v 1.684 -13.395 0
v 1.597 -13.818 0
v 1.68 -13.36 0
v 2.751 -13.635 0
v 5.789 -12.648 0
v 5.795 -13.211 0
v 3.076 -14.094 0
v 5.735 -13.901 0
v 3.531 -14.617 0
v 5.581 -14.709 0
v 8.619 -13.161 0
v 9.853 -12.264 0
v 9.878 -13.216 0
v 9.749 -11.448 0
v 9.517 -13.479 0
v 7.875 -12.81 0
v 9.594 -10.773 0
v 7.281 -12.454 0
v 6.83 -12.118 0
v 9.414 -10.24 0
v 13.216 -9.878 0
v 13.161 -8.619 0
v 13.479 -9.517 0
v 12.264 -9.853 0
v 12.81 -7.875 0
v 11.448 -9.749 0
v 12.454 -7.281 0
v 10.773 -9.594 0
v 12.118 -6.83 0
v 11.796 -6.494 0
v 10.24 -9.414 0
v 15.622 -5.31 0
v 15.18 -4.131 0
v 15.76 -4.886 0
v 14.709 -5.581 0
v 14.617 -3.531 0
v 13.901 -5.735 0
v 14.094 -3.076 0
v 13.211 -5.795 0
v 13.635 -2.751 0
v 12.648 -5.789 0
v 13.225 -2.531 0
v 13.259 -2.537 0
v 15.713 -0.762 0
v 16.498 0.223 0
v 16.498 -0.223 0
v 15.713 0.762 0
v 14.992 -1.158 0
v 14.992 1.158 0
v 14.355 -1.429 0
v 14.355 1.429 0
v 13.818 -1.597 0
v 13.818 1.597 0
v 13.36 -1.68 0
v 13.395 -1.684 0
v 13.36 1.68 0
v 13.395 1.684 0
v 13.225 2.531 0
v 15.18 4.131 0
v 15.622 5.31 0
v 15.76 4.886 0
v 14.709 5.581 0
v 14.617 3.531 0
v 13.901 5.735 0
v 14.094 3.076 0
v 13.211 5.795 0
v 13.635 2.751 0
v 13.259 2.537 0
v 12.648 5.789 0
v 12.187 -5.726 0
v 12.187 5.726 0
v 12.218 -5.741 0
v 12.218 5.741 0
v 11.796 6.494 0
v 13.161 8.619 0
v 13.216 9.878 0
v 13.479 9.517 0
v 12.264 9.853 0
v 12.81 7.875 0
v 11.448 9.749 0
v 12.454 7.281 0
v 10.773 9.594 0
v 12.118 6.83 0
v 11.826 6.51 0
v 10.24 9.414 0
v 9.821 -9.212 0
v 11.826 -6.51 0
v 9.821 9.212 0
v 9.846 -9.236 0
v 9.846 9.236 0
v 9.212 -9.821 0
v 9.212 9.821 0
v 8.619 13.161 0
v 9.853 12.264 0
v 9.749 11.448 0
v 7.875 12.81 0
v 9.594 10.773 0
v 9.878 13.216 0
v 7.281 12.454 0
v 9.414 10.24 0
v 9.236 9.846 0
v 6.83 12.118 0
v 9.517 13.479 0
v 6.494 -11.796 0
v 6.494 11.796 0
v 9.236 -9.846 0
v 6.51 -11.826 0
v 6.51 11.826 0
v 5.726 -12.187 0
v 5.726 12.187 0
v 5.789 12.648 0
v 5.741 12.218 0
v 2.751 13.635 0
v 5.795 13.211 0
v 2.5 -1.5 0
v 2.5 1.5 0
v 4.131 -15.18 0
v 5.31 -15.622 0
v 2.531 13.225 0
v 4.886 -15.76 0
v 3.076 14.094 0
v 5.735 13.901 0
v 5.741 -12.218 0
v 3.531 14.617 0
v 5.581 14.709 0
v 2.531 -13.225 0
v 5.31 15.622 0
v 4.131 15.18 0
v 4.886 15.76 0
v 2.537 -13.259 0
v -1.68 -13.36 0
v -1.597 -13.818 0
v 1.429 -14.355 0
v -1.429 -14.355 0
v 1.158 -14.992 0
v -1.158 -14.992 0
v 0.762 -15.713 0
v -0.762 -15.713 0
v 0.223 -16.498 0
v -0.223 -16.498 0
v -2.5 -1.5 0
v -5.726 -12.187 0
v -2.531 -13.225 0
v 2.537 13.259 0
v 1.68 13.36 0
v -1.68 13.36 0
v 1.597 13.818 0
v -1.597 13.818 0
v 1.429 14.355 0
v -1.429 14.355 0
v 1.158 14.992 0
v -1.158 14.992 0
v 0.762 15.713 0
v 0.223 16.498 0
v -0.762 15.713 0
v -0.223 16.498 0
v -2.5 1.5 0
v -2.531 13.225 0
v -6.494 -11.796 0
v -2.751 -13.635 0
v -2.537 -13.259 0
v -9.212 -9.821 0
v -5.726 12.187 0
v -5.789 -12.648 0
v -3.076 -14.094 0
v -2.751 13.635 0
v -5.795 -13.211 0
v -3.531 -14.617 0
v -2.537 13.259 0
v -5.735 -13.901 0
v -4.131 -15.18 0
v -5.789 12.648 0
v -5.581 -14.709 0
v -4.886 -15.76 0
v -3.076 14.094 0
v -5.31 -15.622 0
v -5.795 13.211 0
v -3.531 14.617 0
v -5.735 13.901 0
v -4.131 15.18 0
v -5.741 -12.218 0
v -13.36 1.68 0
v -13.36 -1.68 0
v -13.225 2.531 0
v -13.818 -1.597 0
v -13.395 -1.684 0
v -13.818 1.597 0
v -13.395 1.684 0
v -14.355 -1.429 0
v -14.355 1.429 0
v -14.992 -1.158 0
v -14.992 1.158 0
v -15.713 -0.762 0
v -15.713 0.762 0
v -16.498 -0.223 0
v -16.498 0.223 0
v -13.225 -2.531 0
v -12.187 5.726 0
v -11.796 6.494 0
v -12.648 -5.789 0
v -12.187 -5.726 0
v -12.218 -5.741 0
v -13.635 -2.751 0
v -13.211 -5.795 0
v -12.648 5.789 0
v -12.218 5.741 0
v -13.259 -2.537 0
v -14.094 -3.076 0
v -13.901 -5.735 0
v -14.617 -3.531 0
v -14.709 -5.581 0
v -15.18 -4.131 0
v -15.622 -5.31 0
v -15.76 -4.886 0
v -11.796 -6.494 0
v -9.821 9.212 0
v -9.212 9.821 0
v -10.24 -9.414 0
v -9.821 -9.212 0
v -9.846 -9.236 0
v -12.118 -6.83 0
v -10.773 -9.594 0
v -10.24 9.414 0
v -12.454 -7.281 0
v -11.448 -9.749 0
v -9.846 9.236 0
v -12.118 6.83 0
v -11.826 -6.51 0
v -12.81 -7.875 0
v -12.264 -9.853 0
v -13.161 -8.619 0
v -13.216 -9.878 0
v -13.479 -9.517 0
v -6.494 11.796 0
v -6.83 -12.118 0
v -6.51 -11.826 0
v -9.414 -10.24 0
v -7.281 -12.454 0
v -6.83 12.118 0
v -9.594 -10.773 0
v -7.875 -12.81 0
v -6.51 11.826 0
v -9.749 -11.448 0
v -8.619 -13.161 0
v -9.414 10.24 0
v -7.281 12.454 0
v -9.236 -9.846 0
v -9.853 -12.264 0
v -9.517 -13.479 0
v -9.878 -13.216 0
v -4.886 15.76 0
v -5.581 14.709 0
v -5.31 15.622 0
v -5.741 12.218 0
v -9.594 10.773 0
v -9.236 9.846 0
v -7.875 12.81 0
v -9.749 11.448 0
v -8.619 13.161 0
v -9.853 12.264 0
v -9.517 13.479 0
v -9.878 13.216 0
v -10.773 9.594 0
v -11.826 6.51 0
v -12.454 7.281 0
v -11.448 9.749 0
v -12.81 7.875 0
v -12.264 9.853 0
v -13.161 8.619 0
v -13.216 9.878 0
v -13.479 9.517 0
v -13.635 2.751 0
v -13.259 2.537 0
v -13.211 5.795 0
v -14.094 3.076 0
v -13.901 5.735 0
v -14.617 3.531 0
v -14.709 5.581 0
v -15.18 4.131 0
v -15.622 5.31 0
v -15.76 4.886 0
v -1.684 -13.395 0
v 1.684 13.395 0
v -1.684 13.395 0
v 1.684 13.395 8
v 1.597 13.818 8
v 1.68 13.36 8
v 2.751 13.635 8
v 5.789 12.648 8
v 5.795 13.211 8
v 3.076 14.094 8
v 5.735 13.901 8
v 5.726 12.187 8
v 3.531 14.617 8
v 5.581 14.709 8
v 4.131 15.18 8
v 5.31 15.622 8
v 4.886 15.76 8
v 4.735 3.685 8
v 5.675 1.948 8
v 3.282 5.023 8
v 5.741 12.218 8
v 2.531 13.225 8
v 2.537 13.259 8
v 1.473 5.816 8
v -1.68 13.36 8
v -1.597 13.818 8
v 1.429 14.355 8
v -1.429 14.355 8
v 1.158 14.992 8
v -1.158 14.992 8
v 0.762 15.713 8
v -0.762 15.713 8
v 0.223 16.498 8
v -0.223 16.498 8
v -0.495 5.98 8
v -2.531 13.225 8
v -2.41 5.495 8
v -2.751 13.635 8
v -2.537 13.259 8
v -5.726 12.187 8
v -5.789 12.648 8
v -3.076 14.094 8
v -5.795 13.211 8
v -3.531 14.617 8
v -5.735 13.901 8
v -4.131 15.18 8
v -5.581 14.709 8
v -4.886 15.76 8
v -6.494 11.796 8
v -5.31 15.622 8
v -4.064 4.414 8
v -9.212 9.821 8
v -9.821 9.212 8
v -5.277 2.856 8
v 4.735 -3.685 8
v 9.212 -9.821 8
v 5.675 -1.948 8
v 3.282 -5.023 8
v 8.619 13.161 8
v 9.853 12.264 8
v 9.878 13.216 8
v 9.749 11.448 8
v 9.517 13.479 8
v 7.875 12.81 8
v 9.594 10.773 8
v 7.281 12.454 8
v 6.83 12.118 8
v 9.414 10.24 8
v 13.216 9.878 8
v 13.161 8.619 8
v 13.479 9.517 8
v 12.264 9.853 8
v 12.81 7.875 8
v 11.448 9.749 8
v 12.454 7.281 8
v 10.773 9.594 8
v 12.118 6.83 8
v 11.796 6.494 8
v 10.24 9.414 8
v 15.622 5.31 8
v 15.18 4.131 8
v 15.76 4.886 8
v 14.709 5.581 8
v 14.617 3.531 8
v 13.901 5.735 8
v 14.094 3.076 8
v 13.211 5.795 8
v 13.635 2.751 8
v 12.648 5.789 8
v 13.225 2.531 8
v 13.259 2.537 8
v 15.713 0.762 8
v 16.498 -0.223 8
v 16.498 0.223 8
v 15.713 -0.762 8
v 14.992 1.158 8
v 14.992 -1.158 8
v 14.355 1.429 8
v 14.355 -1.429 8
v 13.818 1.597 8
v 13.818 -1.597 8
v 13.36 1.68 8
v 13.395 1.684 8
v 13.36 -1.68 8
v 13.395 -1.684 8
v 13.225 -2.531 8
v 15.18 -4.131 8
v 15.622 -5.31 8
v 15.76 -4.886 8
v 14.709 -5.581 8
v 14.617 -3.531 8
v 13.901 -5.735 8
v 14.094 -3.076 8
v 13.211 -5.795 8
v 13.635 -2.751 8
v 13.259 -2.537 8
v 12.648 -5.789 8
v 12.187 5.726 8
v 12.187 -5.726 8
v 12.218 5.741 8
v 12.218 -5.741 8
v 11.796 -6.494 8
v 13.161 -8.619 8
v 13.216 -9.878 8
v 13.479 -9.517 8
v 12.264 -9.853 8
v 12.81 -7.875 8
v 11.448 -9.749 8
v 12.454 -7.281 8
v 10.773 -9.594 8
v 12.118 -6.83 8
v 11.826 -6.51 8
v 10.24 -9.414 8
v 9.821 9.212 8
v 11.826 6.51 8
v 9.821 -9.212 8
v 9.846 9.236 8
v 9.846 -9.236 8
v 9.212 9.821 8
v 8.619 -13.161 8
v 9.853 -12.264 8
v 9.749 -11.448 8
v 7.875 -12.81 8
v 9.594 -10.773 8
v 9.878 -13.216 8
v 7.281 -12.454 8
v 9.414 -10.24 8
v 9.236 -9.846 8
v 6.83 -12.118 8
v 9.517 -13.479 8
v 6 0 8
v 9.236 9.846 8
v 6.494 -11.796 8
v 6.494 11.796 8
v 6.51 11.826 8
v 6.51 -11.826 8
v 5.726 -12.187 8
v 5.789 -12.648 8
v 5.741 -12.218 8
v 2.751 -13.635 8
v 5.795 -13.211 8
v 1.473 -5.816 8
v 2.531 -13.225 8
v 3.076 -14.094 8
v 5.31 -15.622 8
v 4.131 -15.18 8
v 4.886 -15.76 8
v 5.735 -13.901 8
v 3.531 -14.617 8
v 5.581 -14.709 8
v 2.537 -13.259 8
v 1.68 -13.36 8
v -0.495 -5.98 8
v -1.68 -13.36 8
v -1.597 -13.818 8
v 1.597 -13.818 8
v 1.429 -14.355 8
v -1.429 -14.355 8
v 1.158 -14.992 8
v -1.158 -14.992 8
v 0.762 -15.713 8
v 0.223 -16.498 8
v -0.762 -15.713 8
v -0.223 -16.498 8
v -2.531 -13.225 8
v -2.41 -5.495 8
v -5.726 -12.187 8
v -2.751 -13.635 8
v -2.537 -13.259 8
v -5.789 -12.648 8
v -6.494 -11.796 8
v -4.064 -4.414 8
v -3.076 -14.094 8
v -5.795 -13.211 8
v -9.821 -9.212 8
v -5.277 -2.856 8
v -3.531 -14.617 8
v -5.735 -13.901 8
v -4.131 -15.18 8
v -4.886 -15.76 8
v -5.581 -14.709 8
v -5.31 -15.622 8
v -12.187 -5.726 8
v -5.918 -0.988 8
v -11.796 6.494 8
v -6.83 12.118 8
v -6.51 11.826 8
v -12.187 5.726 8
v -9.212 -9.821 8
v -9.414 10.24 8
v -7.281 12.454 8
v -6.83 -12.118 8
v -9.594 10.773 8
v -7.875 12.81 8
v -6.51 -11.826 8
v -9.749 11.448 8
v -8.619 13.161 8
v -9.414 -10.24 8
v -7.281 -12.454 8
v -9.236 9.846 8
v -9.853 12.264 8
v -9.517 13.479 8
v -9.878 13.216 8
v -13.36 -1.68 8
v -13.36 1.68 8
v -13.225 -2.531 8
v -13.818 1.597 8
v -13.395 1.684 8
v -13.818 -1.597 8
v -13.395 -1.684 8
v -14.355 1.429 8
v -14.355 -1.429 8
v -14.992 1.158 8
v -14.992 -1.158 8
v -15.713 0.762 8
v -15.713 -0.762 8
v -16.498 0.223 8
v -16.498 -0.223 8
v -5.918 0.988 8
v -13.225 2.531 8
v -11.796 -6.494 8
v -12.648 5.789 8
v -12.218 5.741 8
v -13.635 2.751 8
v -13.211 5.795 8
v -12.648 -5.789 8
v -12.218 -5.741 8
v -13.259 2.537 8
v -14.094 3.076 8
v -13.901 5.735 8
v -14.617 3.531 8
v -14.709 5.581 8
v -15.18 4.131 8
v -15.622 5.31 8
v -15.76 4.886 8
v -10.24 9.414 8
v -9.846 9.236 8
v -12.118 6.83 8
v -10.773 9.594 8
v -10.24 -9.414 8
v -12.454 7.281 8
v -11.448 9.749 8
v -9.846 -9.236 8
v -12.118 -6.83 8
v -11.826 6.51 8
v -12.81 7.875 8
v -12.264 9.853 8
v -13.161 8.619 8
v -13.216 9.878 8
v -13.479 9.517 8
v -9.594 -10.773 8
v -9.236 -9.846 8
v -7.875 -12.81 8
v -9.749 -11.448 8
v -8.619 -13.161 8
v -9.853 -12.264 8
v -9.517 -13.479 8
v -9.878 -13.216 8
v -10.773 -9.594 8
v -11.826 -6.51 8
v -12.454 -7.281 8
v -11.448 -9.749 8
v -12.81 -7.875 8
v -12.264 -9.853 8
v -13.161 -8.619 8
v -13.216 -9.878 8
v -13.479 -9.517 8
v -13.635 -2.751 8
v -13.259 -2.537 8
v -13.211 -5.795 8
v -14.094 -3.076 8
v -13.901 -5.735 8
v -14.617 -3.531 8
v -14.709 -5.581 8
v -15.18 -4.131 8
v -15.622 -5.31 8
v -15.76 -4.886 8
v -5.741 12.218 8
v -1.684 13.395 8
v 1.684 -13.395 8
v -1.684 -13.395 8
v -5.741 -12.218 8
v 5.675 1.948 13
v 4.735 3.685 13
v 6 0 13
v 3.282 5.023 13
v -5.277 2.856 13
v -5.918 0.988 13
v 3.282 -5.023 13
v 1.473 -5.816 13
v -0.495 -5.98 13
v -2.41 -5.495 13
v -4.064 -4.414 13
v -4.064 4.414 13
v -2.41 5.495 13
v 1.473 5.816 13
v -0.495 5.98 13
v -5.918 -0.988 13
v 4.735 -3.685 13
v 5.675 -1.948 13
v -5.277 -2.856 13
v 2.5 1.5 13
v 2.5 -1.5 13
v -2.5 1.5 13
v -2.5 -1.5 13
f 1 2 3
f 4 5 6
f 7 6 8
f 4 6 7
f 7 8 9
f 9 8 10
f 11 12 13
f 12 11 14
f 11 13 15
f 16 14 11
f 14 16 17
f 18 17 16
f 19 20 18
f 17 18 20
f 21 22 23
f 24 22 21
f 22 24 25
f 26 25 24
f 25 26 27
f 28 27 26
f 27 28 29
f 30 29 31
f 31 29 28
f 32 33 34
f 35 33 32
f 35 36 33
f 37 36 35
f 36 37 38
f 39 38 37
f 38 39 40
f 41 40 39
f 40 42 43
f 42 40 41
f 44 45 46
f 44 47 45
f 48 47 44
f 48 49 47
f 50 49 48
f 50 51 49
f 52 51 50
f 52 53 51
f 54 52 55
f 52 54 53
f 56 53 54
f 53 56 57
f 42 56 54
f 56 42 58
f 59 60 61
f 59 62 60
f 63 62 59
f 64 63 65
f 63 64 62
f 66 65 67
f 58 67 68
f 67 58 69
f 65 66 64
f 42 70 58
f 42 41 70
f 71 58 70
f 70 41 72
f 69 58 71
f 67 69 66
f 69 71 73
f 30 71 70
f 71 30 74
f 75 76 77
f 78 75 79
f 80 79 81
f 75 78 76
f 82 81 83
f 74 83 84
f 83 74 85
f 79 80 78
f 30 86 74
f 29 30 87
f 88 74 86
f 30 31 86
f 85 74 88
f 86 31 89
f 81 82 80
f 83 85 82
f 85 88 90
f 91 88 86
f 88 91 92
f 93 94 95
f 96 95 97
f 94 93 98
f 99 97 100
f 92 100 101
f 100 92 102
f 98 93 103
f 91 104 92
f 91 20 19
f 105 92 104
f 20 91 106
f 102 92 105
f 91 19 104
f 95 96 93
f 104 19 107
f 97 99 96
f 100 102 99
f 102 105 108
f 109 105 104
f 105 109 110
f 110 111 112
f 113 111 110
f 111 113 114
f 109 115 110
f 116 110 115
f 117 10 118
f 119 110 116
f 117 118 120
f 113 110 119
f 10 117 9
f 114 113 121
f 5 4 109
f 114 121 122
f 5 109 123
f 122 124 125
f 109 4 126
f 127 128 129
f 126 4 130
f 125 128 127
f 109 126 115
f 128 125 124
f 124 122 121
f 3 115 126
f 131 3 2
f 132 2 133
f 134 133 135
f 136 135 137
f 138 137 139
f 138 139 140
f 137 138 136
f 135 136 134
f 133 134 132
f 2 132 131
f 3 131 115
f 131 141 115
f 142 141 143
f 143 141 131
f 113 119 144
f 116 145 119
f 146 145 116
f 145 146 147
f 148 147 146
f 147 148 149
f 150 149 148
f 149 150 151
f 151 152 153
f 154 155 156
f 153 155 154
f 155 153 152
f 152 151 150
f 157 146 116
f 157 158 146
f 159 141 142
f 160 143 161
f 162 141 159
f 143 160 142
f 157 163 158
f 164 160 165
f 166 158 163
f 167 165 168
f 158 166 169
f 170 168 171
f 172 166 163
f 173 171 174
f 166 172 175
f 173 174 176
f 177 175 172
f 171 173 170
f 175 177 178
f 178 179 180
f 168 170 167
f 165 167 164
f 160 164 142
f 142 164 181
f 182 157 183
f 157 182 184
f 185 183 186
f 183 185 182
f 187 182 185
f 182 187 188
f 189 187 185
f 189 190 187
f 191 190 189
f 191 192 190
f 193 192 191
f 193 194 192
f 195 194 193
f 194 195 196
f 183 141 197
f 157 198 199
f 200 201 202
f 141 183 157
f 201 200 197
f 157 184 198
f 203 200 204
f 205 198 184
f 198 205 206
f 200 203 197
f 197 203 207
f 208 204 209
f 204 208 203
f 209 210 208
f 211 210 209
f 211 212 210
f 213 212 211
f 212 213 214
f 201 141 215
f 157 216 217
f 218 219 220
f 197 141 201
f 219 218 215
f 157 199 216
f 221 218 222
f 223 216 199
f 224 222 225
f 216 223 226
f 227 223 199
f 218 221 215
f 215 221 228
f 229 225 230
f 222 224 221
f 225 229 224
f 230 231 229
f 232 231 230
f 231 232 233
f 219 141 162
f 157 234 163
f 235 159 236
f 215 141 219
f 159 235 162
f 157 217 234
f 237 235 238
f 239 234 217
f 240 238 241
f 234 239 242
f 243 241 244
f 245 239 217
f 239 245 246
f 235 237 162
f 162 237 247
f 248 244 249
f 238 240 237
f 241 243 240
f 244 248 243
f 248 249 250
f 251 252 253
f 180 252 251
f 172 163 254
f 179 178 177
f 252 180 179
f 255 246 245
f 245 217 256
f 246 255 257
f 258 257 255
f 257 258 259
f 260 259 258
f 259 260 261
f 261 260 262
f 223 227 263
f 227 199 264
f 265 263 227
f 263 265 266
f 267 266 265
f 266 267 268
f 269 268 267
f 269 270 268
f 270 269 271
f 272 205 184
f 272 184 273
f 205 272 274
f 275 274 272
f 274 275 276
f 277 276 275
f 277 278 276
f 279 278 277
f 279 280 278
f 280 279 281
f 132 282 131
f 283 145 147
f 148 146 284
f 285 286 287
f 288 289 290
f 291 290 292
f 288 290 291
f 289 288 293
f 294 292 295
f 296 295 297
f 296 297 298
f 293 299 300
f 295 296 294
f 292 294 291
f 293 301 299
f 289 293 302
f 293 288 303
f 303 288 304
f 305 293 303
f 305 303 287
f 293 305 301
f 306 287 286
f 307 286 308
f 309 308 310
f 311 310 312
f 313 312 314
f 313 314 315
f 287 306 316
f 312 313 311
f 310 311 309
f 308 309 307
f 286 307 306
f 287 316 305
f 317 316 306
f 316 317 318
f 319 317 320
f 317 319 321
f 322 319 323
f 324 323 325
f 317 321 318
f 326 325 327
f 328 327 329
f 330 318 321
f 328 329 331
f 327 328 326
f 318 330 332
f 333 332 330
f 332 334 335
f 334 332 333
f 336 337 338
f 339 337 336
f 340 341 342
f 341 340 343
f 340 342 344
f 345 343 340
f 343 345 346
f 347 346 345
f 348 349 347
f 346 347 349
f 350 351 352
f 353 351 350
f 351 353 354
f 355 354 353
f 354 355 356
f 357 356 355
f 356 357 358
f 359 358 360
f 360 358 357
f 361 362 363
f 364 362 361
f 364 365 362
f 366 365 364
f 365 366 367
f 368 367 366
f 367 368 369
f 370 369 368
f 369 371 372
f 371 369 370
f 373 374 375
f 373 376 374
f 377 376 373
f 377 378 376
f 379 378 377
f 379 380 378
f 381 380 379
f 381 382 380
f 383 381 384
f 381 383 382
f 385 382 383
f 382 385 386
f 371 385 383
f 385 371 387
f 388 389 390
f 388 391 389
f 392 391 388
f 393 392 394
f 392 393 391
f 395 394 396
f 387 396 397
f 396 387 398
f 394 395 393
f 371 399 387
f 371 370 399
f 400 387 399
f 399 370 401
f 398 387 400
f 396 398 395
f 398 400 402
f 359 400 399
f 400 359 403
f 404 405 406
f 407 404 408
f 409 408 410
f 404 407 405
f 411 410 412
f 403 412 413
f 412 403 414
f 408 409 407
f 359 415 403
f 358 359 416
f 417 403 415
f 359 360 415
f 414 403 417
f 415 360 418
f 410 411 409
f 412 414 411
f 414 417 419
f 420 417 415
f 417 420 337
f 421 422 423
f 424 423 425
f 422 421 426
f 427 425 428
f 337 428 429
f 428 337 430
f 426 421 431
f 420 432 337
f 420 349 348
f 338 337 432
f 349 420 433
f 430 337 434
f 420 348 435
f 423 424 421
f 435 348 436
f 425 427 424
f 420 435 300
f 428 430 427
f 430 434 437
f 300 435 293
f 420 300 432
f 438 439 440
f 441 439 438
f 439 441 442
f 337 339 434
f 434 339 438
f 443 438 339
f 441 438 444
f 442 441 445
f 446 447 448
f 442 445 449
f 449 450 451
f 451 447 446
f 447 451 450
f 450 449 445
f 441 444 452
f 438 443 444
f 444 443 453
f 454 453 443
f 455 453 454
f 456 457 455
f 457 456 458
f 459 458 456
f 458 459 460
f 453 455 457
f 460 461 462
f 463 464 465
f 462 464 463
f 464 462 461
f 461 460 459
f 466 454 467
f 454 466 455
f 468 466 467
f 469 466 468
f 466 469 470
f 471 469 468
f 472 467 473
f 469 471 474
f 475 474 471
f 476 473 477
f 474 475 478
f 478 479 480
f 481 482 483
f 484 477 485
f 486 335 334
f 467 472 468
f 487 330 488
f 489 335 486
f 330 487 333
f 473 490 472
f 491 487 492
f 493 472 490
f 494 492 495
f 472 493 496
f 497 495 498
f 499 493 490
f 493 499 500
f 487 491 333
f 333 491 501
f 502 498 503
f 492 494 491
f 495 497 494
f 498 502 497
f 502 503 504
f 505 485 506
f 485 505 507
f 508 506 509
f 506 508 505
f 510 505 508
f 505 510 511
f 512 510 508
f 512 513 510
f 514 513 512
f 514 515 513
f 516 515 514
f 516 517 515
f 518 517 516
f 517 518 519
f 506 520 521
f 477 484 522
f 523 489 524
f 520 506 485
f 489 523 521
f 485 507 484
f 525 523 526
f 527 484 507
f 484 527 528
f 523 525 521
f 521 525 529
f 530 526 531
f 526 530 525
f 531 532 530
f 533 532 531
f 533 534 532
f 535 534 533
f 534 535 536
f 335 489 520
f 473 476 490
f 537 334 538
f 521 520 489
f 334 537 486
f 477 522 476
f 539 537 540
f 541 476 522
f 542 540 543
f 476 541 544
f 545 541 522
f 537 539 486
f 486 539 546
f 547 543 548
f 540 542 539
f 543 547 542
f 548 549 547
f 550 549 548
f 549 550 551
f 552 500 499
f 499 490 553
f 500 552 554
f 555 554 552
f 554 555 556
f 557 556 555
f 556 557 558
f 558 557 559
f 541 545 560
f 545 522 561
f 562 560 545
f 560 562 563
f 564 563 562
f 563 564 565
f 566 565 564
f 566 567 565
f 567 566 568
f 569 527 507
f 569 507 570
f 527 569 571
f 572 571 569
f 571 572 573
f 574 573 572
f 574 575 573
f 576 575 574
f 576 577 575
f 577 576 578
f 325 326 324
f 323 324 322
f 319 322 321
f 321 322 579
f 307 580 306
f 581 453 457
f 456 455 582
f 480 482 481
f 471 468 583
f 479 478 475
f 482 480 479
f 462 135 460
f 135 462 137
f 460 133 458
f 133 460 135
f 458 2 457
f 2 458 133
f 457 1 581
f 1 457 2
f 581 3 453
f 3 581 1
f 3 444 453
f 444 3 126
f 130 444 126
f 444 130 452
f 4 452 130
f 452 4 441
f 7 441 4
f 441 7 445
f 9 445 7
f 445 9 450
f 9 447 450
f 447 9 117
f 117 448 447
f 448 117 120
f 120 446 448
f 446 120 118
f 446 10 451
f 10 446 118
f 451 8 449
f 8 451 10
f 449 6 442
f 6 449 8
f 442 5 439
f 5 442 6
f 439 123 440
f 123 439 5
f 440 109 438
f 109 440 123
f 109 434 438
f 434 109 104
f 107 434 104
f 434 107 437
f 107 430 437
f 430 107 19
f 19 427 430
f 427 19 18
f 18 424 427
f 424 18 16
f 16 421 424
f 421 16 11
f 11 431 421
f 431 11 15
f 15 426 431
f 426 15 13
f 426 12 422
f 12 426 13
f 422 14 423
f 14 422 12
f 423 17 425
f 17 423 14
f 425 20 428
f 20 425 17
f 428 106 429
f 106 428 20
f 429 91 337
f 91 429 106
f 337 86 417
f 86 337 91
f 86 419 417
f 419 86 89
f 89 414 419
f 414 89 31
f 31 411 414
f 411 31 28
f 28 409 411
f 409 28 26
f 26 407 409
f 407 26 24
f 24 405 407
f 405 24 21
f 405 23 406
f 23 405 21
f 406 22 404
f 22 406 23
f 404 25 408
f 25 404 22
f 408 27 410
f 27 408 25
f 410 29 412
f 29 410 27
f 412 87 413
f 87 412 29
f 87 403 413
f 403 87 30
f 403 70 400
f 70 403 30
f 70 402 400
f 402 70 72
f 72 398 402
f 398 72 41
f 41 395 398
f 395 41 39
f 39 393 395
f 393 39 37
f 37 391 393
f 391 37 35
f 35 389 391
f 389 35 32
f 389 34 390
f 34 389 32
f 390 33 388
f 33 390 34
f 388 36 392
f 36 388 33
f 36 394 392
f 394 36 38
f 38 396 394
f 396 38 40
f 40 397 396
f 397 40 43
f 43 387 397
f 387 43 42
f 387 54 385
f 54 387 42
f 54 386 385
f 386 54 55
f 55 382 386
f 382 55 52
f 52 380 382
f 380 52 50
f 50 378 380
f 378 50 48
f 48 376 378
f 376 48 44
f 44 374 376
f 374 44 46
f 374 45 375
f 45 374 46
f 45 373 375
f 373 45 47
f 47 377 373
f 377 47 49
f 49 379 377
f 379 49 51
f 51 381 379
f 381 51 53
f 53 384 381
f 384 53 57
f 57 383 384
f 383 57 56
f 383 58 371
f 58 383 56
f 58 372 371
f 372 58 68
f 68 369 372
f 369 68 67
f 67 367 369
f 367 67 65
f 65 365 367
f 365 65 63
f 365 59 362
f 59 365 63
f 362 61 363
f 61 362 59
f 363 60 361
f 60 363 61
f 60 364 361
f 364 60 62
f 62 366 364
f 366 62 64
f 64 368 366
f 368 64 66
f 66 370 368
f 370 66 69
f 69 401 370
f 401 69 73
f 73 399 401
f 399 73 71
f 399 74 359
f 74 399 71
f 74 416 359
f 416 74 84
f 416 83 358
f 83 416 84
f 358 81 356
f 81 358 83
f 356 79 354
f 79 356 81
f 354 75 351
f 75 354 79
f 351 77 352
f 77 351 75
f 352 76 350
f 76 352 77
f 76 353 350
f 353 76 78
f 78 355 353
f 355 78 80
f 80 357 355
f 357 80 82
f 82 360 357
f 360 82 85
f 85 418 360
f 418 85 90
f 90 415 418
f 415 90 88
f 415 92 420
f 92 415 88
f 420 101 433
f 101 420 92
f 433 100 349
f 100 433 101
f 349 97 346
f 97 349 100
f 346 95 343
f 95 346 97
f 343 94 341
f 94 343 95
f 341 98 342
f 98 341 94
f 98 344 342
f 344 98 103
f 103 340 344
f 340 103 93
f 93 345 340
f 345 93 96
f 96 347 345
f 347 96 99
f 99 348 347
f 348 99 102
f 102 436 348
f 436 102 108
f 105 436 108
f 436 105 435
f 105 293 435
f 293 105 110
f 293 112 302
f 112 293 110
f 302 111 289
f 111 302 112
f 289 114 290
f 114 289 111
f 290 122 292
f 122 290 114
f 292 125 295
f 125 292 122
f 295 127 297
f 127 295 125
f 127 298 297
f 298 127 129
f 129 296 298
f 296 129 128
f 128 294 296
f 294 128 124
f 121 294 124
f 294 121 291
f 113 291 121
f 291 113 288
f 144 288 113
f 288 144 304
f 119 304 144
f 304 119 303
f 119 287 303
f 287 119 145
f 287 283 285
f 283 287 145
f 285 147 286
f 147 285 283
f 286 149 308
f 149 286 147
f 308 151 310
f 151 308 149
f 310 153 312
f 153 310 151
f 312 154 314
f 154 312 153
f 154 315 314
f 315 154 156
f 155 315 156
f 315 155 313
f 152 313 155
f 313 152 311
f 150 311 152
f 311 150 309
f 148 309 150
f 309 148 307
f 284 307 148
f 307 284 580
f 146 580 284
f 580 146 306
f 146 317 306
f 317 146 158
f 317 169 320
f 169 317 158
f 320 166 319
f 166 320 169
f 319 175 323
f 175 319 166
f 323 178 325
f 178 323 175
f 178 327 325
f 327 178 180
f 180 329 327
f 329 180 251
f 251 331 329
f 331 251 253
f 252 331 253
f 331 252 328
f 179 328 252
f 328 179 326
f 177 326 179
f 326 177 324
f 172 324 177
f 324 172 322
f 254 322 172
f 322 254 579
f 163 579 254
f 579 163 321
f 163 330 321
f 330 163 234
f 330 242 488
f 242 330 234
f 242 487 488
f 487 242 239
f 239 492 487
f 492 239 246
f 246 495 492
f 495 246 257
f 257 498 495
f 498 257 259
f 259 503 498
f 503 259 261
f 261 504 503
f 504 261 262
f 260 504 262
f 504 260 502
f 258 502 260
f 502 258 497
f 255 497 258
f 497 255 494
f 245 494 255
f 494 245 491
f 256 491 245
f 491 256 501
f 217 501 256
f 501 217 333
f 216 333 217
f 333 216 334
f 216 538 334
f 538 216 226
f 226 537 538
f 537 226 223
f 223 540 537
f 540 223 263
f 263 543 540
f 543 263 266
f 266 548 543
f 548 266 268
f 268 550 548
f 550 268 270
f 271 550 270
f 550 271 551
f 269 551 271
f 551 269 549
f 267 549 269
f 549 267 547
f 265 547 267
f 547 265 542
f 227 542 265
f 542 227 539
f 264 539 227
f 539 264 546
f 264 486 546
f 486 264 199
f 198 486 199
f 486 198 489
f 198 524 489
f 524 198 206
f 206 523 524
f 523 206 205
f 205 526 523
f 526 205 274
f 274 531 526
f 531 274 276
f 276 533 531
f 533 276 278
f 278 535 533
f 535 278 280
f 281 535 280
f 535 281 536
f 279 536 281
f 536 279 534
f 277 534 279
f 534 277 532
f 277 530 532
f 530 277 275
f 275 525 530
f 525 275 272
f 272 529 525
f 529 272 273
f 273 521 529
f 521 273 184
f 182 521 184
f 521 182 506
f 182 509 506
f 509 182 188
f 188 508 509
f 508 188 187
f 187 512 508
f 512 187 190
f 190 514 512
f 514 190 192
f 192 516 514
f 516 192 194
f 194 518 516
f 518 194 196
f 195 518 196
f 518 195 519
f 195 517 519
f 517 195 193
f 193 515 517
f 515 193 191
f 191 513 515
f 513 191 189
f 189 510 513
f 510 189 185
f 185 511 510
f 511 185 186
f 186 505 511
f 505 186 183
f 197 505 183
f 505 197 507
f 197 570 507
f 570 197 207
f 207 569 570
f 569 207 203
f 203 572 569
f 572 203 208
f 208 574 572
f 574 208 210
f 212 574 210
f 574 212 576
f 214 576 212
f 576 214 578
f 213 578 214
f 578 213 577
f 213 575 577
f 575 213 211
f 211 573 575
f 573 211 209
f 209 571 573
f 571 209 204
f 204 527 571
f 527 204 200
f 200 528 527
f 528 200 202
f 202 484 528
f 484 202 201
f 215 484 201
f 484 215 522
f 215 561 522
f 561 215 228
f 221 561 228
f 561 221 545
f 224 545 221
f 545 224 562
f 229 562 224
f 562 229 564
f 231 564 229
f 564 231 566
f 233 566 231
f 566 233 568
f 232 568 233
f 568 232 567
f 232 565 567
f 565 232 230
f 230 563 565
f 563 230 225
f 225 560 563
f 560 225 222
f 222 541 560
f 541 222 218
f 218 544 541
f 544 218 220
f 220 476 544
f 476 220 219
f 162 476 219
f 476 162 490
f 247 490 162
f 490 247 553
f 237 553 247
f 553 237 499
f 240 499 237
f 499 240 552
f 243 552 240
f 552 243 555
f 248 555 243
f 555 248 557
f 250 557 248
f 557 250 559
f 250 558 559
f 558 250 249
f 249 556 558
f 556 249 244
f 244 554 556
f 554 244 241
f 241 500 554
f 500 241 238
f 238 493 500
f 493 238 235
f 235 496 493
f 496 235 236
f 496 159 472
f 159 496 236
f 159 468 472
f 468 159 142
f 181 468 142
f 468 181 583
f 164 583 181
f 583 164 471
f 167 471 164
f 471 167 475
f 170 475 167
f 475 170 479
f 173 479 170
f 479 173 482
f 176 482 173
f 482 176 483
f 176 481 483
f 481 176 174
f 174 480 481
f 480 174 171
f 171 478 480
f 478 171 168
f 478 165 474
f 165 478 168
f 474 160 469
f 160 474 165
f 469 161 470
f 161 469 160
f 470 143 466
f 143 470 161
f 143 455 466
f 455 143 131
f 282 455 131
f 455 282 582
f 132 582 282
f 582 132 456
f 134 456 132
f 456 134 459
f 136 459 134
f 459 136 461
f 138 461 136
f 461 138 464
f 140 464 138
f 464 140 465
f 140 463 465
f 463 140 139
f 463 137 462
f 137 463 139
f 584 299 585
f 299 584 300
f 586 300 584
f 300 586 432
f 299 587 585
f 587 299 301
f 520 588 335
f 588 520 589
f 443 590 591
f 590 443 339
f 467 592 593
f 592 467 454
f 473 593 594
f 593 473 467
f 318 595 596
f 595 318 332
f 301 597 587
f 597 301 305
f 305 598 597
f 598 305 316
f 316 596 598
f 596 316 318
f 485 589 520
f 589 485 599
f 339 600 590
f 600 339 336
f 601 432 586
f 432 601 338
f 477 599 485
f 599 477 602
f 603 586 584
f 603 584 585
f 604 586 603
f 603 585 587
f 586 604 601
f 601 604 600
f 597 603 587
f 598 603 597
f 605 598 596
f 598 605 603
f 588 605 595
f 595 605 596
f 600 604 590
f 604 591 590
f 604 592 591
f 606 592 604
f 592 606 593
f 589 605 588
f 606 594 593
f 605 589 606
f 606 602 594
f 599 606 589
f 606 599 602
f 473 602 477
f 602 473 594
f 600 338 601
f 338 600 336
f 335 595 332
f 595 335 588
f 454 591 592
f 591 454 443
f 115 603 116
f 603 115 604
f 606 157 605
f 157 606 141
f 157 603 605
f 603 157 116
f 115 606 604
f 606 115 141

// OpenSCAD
// Lay out the gears that I am going to use for the telescope mount

// the gear library I'm using
use <parametric_involute_gear_v5.0.scad>;

// my explicit gear parameters
number_of_teeth = 20;
pitch_diameter = 30;
pressure_angle = 30;
border_width = 5;
gear_thickness = 8;
border_thickness = gear_thickness;
hub_thickness = 13;
hub_diameter = 12;
circles = 0;

// my derived gear parameters
diametral_pitch = number_of_teeth / pitch_diameter;
echo(str("Diametral Pitch = ", diametral_pitch));
rim_thickness = border_thickness;
rim_width = border_width;

// gear parameters I'm not using
clearance = 0;
bore_diameter = 0;
backlash = 0;

// assemble the big gear - remember that its diametral pitch must match the mating gear
difference() {
    // lay out the basic gear
    gear(
        number_of_teeth=number_of_teeth,
        diametral_pitch=diametral_pitch,
        pressure_angle=pressure_angle,
        clearance=clearance,
        gear_thickness=gear_thickness,
        rim_thickness=rim_thickness,
        rim_width=rim_width,
        hub_thickness=hub_thickness,
        hub_diameter=hub_diameter,
        bore_diameter=bore_diameter,
        circles=circles,
        backlash=backlash
    );
    // create the axis type that I expect
    cube([5, 3, hub_thickness*2], center=true);
}
